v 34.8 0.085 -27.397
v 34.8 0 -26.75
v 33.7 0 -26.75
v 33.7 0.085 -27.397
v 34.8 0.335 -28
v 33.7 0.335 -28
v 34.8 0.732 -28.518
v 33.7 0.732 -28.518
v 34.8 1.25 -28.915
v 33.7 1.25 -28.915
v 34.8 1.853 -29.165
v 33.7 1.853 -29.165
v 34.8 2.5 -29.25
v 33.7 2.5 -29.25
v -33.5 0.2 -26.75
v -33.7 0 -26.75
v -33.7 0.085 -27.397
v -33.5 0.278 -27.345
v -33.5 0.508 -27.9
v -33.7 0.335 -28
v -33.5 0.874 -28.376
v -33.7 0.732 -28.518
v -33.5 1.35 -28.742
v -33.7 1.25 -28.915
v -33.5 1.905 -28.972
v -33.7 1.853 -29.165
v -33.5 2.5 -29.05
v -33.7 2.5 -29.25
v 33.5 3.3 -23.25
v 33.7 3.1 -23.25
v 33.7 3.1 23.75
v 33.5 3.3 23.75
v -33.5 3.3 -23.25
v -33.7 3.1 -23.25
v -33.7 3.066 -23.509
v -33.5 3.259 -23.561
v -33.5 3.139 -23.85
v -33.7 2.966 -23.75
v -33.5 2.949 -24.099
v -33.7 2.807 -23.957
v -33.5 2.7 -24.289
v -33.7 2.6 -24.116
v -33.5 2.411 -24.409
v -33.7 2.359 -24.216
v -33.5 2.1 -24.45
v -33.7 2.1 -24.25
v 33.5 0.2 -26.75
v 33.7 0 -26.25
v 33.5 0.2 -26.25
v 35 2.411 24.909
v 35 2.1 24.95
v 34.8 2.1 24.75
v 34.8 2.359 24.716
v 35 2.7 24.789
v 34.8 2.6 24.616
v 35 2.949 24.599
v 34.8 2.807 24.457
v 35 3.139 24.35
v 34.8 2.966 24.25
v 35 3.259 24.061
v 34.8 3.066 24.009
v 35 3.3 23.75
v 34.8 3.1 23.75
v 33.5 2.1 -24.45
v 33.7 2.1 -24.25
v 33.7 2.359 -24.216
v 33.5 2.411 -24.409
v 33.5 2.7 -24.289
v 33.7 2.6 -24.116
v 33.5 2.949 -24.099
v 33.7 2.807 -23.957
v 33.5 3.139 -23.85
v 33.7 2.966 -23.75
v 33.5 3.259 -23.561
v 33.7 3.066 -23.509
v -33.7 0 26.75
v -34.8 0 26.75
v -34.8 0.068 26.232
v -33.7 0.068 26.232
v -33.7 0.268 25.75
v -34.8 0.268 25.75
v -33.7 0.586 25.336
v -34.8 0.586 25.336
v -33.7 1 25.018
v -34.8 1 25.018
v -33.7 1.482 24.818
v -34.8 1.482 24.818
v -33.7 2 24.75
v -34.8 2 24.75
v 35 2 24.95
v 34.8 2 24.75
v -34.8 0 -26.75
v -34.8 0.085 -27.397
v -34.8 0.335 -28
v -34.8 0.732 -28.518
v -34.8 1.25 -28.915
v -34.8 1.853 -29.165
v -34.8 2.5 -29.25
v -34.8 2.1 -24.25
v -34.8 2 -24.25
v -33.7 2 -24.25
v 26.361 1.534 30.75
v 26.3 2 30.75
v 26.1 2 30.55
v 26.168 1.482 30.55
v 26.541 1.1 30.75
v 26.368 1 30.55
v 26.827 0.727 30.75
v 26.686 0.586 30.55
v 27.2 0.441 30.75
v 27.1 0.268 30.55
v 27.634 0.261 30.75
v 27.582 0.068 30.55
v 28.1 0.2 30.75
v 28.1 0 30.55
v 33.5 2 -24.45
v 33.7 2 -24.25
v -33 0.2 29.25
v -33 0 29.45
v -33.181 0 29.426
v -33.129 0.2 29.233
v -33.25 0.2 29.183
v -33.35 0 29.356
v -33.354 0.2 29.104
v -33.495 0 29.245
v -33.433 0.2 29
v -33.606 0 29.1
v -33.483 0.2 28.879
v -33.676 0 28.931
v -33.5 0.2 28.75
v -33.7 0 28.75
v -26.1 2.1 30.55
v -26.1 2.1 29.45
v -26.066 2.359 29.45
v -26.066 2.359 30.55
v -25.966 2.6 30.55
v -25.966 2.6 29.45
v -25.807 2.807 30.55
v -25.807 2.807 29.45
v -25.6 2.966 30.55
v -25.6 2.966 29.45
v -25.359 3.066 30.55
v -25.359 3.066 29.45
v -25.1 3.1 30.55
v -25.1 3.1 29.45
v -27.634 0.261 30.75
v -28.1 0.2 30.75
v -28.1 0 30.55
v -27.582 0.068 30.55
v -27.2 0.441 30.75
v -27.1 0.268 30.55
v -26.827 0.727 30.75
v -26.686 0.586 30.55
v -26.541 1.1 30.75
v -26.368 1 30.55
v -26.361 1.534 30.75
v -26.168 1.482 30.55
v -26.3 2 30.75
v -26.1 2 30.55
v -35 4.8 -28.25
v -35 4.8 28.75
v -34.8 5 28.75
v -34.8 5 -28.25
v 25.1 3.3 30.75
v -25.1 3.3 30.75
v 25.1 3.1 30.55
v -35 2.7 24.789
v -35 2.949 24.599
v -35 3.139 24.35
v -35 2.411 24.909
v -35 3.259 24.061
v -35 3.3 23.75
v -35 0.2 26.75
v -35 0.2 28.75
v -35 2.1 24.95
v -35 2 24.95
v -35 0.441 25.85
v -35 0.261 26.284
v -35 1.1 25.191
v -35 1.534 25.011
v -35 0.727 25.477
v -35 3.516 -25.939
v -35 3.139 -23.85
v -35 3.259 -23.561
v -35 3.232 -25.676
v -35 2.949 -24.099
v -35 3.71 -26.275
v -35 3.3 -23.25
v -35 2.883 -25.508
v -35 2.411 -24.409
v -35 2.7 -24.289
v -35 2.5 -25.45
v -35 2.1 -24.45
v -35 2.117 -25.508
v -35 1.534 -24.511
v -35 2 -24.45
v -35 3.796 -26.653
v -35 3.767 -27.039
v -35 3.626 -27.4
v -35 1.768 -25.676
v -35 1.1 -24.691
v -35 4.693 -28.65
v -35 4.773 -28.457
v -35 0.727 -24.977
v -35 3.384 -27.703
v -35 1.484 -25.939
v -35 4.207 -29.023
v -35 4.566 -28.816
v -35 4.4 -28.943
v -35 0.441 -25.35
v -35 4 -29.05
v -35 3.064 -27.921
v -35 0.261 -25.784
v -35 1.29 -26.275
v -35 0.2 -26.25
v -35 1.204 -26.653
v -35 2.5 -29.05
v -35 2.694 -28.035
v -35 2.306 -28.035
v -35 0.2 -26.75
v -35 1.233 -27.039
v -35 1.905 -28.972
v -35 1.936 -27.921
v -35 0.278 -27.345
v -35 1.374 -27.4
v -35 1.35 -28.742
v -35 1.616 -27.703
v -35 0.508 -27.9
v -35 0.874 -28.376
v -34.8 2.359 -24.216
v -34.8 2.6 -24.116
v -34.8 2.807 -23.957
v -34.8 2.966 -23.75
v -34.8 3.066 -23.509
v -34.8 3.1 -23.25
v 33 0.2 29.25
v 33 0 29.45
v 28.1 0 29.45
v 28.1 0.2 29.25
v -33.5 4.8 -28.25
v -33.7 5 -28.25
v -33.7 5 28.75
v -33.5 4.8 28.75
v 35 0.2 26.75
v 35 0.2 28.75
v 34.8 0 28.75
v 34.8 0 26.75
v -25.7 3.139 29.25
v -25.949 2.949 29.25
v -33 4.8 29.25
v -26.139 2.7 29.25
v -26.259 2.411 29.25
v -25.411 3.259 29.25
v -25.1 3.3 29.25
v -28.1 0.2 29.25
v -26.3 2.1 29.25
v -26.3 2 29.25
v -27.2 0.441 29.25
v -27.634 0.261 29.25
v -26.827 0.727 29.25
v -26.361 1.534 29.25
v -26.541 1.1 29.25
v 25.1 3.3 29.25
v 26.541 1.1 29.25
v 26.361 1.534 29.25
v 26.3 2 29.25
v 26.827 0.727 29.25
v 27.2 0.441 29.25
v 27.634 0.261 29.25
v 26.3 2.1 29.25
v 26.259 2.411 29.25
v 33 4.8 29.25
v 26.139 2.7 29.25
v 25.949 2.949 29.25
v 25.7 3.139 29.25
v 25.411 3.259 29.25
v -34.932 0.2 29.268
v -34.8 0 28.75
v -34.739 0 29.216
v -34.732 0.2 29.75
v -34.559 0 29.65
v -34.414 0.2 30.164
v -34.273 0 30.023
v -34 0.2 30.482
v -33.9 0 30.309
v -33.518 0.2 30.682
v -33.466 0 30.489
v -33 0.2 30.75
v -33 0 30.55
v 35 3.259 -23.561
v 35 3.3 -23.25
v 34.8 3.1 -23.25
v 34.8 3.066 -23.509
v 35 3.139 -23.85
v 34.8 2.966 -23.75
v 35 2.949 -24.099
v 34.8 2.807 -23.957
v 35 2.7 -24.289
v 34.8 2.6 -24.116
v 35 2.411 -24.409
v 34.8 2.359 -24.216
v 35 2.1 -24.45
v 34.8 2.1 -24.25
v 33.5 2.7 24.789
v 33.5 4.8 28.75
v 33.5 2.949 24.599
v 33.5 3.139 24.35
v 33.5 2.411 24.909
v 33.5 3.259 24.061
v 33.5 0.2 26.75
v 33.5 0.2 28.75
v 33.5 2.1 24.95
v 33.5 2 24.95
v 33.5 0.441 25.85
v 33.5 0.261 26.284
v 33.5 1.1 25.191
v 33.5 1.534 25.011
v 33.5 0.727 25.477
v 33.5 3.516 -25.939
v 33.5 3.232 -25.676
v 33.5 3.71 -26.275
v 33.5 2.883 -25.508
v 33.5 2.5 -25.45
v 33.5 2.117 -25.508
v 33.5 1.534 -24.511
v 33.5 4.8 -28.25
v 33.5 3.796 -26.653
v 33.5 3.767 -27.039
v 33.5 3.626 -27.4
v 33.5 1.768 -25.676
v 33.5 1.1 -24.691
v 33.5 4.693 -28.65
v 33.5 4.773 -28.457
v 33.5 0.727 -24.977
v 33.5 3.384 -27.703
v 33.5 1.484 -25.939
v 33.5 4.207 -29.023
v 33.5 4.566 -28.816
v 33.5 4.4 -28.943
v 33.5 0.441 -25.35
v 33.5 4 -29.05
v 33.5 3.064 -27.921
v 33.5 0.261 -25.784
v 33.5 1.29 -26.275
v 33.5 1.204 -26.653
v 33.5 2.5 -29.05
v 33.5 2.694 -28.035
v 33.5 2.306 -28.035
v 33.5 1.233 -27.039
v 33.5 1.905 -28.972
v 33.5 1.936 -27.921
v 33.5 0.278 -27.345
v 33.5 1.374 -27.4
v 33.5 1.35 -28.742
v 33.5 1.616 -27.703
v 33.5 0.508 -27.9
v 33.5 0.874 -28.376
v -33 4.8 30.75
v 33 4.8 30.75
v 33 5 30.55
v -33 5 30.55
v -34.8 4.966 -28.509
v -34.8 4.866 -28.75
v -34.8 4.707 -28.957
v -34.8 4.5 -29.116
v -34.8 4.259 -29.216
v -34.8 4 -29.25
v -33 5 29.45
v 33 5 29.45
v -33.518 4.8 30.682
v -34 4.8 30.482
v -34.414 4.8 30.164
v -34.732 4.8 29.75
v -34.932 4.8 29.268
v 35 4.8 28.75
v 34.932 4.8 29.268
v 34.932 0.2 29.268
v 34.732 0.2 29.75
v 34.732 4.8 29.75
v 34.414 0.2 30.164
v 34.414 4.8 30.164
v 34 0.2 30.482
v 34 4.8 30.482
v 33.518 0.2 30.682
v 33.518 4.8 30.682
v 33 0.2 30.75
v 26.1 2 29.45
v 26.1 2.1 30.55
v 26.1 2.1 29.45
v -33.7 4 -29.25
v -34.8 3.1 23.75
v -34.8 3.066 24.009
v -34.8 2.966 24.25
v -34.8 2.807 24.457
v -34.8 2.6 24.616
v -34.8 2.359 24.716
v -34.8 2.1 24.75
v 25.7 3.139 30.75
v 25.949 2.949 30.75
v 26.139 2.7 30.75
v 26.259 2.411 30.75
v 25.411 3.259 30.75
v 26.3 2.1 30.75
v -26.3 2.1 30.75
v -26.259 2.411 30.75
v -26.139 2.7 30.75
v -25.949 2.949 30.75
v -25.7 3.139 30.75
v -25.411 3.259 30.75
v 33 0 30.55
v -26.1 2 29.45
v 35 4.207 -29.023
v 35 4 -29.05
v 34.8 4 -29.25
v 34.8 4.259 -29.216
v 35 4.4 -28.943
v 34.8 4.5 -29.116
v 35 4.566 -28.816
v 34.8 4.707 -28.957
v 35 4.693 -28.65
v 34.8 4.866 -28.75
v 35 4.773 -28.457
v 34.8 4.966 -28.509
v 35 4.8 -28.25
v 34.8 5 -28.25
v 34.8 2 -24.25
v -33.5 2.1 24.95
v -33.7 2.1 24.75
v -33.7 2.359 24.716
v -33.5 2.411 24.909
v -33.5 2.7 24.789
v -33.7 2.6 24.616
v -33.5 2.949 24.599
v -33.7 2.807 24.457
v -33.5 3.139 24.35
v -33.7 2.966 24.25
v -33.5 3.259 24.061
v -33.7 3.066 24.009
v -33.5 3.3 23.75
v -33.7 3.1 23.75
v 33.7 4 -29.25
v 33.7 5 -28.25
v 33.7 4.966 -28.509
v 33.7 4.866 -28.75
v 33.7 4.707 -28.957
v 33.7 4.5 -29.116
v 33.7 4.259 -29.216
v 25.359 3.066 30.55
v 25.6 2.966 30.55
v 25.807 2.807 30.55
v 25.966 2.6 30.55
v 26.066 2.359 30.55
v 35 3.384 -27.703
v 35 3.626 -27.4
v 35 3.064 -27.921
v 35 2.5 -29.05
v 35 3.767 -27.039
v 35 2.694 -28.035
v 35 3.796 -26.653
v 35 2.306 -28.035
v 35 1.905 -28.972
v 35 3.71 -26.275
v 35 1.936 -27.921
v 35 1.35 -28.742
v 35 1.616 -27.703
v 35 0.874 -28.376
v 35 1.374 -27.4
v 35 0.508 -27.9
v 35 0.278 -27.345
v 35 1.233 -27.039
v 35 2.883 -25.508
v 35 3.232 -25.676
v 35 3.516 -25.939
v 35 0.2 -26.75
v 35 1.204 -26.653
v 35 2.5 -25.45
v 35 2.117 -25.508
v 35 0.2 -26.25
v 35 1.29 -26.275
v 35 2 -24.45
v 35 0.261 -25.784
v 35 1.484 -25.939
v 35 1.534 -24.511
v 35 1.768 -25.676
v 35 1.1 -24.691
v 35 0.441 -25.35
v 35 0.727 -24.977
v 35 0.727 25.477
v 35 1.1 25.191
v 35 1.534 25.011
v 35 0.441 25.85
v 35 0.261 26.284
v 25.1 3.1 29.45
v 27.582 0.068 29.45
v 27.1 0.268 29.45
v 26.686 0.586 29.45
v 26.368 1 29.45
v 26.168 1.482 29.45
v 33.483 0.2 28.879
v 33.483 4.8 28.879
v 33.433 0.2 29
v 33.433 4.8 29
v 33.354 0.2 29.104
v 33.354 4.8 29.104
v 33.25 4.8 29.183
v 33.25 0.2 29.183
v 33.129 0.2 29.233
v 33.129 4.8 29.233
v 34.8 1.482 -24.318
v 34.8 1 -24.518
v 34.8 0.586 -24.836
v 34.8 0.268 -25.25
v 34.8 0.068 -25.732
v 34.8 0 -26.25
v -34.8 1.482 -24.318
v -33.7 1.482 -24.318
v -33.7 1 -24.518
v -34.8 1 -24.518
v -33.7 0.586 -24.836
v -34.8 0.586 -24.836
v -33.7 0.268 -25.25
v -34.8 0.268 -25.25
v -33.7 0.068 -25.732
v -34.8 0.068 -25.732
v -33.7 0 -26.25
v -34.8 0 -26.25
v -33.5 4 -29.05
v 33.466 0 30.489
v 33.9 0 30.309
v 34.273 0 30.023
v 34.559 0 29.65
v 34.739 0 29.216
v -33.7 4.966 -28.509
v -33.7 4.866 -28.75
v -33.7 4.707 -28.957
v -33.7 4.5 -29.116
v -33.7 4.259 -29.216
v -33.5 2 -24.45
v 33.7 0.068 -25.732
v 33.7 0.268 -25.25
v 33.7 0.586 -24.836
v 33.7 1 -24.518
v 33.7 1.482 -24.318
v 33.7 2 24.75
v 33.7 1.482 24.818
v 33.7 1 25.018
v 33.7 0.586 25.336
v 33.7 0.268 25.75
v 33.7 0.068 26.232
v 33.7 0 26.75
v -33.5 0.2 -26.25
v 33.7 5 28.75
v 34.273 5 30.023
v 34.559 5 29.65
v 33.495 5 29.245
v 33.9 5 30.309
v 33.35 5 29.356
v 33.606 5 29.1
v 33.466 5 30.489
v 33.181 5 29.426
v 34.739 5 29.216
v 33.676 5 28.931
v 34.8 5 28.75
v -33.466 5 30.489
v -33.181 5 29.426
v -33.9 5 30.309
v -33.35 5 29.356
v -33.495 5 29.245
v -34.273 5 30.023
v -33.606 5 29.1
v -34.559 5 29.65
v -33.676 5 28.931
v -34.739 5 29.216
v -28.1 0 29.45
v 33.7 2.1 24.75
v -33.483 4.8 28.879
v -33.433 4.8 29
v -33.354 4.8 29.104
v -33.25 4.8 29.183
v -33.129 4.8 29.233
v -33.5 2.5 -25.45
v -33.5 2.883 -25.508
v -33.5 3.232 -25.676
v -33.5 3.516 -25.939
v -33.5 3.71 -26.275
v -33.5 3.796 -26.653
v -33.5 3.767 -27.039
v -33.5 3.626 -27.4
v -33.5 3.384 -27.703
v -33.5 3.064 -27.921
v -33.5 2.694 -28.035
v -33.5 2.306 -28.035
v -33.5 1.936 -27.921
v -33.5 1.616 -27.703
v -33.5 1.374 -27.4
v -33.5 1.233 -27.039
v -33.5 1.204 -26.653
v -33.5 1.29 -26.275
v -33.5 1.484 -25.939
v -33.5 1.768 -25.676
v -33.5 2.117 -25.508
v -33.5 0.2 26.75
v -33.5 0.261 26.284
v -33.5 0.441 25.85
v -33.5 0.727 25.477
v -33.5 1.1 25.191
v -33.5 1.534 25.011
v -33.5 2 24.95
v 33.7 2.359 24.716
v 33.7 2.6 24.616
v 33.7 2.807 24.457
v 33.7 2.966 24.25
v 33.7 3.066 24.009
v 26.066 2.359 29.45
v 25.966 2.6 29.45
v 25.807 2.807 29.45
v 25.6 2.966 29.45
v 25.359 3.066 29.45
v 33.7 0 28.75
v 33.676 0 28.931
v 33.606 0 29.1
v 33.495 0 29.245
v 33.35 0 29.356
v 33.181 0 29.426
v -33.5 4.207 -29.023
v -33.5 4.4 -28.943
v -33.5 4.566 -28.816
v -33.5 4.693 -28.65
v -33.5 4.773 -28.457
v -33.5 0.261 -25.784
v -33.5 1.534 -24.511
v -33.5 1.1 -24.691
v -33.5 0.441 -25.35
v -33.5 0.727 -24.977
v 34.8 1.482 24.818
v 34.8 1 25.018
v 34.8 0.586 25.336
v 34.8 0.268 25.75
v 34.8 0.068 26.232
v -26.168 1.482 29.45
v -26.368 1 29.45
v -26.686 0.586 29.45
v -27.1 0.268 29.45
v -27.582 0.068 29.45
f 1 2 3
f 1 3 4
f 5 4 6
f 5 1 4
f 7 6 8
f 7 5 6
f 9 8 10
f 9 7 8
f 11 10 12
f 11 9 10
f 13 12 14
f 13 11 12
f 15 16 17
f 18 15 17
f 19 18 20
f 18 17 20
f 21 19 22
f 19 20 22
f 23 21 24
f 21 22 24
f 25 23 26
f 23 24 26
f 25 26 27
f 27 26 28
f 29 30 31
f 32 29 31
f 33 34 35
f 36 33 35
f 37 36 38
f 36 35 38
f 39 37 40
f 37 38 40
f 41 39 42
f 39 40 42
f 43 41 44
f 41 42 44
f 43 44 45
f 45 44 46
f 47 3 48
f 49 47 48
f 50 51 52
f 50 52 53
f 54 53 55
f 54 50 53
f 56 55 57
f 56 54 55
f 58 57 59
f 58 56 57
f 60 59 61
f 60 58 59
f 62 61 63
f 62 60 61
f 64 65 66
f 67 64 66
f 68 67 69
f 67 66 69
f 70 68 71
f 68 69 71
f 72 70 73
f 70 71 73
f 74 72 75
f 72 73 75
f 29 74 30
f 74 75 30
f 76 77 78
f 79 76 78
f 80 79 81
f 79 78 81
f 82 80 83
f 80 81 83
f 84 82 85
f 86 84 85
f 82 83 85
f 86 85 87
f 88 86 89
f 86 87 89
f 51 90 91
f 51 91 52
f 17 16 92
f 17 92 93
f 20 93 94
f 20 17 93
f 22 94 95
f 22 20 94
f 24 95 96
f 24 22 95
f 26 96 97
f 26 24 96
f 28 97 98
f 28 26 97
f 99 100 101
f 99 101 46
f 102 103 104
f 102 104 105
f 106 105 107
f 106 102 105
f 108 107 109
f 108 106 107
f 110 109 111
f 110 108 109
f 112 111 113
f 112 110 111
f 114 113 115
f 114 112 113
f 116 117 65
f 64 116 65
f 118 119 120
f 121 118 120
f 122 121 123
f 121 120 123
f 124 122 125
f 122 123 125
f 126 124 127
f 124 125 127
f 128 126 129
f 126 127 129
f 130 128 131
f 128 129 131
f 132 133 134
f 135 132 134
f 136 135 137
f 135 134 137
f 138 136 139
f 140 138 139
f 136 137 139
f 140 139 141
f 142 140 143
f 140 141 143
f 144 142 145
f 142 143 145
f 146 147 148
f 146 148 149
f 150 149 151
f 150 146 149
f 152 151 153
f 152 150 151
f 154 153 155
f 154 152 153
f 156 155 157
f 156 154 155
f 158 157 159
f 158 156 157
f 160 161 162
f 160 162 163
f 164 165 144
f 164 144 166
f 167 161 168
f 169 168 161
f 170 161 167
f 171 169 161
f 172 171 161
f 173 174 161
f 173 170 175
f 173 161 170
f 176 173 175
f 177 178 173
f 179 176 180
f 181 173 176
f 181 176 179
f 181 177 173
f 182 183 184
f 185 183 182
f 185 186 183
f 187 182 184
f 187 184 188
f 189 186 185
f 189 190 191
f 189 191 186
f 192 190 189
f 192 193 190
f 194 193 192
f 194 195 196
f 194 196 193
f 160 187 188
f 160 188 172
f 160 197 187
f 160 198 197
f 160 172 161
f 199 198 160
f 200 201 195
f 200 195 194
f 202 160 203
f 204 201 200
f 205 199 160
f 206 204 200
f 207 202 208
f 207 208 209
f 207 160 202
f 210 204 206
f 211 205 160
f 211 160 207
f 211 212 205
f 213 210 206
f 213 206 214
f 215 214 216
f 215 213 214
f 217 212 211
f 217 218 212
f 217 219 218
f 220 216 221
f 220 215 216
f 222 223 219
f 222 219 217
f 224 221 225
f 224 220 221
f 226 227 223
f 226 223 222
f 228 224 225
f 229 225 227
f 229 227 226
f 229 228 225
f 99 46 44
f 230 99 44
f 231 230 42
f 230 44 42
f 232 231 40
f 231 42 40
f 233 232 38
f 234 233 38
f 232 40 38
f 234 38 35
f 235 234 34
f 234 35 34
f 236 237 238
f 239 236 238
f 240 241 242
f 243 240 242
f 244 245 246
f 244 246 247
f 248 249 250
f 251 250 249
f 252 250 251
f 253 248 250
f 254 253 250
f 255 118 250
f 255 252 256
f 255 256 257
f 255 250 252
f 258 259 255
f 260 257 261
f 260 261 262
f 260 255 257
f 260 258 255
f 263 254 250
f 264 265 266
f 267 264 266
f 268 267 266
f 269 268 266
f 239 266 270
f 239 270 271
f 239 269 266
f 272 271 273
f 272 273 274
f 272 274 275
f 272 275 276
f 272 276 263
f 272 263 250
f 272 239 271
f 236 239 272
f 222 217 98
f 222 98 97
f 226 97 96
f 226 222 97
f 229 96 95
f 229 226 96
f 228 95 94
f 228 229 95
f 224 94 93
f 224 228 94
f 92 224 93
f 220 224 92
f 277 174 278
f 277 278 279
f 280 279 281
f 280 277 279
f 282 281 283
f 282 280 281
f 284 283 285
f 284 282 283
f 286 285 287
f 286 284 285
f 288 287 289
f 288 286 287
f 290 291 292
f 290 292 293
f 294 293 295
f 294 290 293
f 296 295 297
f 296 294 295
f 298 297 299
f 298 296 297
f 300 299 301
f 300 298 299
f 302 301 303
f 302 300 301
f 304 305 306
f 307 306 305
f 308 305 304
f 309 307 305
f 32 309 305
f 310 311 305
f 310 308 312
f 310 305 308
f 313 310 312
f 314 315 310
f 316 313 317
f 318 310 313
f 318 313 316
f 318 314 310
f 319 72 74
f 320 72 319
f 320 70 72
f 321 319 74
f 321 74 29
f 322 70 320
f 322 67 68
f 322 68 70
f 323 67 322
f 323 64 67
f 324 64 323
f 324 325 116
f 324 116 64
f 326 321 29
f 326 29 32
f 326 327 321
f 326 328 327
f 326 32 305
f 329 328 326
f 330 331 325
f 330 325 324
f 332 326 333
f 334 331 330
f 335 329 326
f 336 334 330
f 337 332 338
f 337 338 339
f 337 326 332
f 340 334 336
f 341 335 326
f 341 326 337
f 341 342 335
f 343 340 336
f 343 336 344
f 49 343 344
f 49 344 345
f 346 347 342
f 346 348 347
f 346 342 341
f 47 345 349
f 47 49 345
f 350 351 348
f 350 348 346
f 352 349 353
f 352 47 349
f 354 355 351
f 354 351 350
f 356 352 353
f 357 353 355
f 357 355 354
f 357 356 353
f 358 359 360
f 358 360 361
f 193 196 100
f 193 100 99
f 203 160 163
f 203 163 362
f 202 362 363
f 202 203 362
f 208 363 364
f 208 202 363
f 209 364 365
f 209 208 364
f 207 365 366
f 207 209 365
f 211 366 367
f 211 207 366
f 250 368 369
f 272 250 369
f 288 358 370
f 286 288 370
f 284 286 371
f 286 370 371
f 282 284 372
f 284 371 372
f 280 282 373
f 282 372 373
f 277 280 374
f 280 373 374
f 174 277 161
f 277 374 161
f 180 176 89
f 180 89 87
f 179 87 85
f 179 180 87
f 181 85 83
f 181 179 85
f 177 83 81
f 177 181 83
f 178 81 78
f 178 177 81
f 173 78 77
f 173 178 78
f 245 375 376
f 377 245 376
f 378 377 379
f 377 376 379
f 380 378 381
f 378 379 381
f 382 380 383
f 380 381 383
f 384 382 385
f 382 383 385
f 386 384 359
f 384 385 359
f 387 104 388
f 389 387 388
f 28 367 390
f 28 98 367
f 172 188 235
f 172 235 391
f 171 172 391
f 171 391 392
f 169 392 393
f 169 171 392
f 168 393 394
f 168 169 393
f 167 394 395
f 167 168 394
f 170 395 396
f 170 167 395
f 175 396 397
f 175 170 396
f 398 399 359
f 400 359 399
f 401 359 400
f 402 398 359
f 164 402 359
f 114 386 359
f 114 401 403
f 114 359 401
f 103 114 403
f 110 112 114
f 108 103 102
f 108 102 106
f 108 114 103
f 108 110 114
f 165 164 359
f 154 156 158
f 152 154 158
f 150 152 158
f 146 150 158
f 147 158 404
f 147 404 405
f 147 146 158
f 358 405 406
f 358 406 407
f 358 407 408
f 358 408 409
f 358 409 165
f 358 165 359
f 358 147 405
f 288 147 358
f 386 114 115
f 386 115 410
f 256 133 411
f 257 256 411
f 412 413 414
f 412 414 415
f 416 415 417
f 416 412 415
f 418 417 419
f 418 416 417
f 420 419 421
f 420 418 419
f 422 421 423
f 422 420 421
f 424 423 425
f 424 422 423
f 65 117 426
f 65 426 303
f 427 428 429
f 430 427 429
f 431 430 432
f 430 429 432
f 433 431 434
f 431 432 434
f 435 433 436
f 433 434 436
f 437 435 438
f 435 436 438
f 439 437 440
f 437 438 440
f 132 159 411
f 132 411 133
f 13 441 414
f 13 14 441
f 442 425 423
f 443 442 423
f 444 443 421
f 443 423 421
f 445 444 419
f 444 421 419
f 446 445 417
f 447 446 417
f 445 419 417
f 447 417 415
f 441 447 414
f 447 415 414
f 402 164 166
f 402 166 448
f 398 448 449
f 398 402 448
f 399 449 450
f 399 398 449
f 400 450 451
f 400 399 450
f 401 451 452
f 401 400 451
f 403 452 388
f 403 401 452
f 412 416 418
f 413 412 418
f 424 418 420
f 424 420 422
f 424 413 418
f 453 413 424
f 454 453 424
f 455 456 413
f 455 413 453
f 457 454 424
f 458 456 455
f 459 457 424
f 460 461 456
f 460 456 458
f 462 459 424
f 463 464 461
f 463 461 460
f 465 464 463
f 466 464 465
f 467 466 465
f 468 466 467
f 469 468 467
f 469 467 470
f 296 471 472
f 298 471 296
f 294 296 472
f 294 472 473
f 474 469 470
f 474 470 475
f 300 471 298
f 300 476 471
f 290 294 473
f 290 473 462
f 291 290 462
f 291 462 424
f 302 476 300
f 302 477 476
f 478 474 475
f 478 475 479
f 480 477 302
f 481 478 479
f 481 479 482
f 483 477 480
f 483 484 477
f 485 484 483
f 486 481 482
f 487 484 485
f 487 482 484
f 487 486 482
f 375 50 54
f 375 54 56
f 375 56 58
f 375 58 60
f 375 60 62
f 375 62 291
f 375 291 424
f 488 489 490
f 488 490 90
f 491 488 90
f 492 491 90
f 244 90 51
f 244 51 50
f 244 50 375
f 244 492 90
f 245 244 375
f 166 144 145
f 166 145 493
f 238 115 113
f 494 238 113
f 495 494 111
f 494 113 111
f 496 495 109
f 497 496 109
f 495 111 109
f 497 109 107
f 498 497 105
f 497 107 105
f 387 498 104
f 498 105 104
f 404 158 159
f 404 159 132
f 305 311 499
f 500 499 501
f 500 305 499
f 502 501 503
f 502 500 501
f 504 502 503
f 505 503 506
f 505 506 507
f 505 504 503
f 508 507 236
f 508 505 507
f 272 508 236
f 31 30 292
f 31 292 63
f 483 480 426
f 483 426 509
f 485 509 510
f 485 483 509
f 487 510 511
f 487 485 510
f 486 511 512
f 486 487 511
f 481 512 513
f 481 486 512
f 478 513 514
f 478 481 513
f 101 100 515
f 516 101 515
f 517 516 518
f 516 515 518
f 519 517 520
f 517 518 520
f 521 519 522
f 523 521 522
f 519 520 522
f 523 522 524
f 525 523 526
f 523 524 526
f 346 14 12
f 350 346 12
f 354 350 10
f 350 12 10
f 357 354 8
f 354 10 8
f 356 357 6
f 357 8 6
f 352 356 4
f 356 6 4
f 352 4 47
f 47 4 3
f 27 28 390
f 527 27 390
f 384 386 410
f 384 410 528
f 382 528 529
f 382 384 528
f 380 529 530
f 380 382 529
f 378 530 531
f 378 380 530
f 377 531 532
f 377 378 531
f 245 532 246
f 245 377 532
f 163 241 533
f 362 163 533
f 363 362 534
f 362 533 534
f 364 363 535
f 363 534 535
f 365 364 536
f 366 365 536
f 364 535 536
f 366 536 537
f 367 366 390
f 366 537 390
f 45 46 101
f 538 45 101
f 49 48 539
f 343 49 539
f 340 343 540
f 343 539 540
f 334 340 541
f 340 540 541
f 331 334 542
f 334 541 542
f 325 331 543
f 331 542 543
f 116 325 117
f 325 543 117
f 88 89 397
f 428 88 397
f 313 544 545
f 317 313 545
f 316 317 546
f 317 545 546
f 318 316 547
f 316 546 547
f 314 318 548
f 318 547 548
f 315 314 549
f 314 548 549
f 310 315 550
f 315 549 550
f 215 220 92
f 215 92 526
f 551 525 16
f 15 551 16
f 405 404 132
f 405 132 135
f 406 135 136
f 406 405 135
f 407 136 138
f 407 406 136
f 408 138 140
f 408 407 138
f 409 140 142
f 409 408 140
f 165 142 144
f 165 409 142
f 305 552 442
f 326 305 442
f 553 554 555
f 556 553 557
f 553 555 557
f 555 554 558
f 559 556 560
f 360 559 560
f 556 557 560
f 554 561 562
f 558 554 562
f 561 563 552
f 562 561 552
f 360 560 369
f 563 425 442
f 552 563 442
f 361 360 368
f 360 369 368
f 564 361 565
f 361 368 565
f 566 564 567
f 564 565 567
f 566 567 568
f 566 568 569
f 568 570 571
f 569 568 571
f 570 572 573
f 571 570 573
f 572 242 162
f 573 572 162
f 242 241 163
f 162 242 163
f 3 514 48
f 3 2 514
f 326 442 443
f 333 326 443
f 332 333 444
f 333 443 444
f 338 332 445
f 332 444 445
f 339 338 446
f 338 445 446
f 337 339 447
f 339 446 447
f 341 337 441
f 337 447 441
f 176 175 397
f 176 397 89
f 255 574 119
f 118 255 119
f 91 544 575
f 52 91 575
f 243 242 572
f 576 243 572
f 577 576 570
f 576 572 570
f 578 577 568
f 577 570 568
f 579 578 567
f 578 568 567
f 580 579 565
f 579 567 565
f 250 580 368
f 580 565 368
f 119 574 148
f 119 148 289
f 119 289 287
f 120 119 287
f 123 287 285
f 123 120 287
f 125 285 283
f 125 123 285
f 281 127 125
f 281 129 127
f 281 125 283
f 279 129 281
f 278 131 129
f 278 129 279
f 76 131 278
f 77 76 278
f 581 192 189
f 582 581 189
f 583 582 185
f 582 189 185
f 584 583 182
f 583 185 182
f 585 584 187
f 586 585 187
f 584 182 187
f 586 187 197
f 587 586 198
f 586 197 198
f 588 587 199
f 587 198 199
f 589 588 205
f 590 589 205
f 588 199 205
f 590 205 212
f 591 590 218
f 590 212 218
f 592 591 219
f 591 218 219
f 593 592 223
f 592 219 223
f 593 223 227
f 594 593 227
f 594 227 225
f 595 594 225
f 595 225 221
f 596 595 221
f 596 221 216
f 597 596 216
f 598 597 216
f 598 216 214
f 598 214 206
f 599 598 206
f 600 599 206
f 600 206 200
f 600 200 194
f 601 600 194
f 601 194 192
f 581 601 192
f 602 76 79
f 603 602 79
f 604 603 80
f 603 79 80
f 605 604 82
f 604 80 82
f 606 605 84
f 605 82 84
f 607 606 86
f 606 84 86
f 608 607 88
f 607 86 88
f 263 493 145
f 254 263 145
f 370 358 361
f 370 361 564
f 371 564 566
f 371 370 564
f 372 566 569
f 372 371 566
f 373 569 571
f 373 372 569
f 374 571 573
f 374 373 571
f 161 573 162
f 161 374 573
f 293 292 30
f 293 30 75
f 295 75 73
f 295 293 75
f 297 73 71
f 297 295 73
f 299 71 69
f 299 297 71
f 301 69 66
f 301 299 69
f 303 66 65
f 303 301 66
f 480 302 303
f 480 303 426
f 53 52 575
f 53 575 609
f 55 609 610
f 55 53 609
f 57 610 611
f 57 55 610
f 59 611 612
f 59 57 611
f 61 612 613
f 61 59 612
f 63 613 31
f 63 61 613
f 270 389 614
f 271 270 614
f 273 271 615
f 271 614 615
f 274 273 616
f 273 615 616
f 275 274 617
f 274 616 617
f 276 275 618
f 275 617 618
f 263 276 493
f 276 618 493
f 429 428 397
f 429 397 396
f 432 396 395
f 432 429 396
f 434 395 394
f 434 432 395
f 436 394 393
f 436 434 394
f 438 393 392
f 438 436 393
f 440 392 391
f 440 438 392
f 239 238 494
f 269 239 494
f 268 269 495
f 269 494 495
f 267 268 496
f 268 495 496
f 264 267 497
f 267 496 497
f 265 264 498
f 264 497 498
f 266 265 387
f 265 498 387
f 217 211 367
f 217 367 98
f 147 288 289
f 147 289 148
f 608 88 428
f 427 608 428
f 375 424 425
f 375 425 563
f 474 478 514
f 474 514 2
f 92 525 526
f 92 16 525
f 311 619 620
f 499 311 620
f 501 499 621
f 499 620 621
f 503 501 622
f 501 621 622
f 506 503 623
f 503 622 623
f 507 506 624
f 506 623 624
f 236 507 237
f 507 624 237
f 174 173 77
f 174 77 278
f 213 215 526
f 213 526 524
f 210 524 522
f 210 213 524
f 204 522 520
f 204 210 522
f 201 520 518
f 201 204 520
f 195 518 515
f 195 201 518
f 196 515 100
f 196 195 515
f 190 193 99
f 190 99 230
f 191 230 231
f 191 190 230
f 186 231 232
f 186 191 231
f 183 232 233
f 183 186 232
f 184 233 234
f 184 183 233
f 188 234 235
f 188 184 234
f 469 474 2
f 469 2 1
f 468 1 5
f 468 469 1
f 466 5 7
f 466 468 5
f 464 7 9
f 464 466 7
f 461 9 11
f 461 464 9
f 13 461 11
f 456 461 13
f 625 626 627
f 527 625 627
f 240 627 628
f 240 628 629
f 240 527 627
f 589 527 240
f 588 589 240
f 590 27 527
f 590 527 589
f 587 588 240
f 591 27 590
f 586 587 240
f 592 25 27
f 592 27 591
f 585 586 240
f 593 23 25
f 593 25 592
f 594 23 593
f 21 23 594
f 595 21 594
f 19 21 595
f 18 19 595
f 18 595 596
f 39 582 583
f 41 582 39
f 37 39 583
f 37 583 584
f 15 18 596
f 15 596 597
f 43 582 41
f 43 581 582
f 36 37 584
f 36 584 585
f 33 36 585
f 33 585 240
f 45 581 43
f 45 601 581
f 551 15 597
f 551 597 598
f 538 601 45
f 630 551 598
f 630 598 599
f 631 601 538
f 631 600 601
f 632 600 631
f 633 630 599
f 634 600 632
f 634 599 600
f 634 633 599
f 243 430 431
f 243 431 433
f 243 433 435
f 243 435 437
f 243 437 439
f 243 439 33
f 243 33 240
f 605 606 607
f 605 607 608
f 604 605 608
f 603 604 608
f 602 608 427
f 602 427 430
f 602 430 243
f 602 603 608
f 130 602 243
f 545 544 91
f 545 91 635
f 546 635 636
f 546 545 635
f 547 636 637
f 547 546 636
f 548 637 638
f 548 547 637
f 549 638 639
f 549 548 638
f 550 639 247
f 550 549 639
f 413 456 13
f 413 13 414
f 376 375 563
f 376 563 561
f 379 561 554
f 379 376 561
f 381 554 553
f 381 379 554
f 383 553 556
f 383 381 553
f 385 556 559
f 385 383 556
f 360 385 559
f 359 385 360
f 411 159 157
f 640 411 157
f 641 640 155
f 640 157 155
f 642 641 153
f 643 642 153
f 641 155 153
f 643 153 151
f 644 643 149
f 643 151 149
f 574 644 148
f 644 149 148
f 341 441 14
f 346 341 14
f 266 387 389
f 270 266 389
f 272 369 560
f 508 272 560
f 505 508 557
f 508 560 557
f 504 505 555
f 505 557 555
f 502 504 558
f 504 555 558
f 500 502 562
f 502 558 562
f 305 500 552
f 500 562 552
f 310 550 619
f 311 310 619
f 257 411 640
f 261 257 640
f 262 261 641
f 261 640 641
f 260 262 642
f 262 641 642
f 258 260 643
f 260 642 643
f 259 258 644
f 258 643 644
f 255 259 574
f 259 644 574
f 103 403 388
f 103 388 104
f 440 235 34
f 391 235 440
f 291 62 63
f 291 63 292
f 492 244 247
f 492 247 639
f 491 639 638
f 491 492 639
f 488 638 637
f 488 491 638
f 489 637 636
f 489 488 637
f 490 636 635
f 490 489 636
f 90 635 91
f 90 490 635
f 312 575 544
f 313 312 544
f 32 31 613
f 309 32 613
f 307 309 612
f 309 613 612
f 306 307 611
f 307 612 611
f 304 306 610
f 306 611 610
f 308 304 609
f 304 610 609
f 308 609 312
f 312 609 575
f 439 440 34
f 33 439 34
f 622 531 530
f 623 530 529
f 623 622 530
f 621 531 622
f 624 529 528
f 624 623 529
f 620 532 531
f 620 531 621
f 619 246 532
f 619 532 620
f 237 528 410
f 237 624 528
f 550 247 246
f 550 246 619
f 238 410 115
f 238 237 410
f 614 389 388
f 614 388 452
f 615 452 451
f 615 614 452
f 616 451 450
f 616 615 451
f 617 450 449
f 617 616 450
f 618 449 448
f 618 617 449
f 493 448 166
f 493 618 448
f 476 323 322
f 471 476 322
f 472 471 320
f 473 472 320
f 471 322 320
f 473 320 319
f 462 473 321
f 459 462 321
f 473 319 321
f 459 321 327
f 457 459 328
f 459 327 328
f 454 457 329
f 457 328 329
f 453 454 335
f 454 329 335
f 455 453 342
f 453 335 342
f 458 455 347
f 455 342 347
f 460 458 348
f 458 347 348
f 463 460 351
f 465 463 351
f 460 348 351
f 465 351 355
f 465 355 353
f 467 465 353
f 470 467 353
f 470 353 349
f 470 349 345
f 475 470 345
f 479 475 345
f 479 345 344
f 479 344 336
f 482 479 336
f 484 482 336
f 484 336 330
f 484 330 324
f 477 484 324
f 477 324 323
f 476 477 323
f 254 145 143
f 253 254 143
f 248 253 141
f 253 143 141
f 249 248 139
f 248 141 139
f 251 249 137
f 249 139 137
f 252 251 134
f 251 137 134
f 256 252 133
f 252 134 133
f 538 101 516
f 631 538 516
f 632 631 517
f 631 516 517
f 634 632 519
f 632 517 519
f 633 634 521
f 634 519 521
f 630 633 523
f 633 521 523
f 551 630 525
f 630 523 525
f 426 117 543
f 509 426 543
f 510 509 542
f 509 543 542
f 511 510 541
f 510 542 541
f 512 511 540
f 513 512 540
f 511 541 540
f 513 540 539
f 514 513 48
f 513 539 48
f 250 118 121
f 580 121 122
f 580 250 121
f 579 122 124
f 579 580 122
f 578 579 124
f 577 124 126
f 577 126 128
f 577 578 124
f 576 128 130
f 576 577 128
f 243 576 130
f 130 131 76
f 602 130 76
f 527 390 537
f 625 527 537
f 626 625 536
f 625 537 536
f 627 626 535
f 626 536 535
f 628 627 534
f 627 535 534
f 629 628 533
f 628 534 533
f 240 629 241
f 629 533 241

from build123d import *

# Parameters (mm, degrees)
EXTRUDE_1_DEPTH     = 5
FILLET_1_R          = 2
FILLET_2_R          = 0.5
FILLET_3_R          = 2.5
SKETCH_2_R          = 1.3
CUT_EXTRUDE_1_DEPTH = 100
SKETCH_3_W          = 52.2
SKETCH_3_H          = 6.2
CUT_EXTRUDE_2_DEPTH = 5
FILLET_5_R          = 1
SKETCH_4_W          = 49
SKETCH_4_H          = 8.82072143
CUT_EXTRUDE_3_DEPTH = 100
FILLET_6_R          = 1
FILLET_7_R          = 2
CHAMFER_1_SIZE      = 0.2


with BuildPart() as part:
    # 草图1 → 凸台-拉伸1 (new body)
    with BuildSketch(Plane(origin=(0, 0, 0), x_dir=(1, 0, 0), z_dir=(0, 1, 0))):
        Polygon((33.5, 29.25), (35, 29.25), (35, -30.75), (-35, -30.75), (-35, 29.25), (-33.5, 29.25), (-33.5, -29.25), (33.5, -29.25), align=None)
    extrude(amount=EXTRUDE_1_DEPTH)

    # 圆角1
    fillet_1_edges = [part.edges().sort_by_distance(p)[0] for p in [
        (35, 2.5, 30.75),
        (-35, 2.5, 30.75),
    ]]
    fillet(fillet_1_edges, radius=FILLET_1_R)

    # 圆角2
    fillet_2_edges = [part.edges().sort_by_distance(p)[0] for p in [
        (-33.5, 2.5, 29.25),
        (33.5, 2.5, 29.25),
    ]]
    fillet(fillet_2_edges, radius=FILLET_2_R)

    # 圆角3
    fillet_3_edges = [part.edges().sort_by_distance(p)[0] for p in [
        (-34.25, 0, -29.25),
        (34.25, 0, -29.25),
    ]]
    fillet(fillet_3_edges, radius=FILLET_3_R)

    # 草图2 → 切除-拉伸1 (cut)
    with BuildSketch(Plane.ZY.offset(35)):
        with Locations((-26.75, 2.5)):
            Circle(SKETCH_2_R)
    extrude(amount=-CUT_EXTRUDE_1_DEPTH, mode=Mode.SUBTRACT)

    # 草图3 → 切除-拉伸2 (cut)
    with BuildSketch(Plane.XY.offset(30.75)):
        Rectangle(SKETCH_3_W, SKETCH_3_H)
    extrude(amount=-CUT_EXTRUDE_2_DEPTH, mode=Mode.SUBTRACT)

    # 圆角5
    fillet_5_edges = [part.edges().sort_by_distance(p)[0] for p in [
        (-26.1, 3.1, 30),
        (26.1, 3.1, 30),
    ]]
    fillet(fillet_5_edges, radius=FILLET_5_R)

    # 草图4 → 切除-拉伸3 (cut)
    with BuildSketch(Plane.ZY.offset(35)):
        with Locations((0.25, -1.310360715)):
            Rectangle(SKETCH_4_W, SKETCH_4_H)
    extrude(amount=-CUT_EXTRUDE_3_DEPTH, mode=Mode.SUBTRACT)

    # 圆角6
    fillet_6_edges = [part.edges().sort_by_distance(p)[0] for p in [
        (34.25, 3.1, -24.25),
        (-34.25, 3.1, -24.25),
        (34.25, 3.1, 24.75),
        (-34.25, 3.1, 24.75),
        (-34.25, 5, -29.25),
        (34.25, 5, -29.25),
    ]]
    fillet(fillet_6_edges, radius=FILLET_6_R)

    # 圆角7
    fillet_7_edges = [part.edges().sort_by_distance(p)[0] for p in [
        (-34.25, 0, 24.75),
        (-34.25, 0, -24.25),
        (34.25, 0, -24.25),
        (34.25, 0, 24.75),
        (-26.1, 0, 30),
        (26.1, 0, 30),
    ]]
    fillet(fillet_7_edges, radius=FILLET_7_R)

    # 倒角1
    chamfer_1_edges = [part.edges().sort_by_distance(p)[0] for p in [
        (33.5, 5, 0.25),
        (-35, 5, 0.25),
        (-35, 2.05, -24.25),
        (-35, 3.1, 0.25),
        (-35, 3.25, -29.25),
        (-35, 4.707106781, -28.957106781),
        (-33.5, 3.25, -29.25),
        (-33.5, 3.1, 0.25),
        (-33.5, 2.05, -24.25),
        (-33.5, 4.707106781, -28.957106781),
        (33.5, 3.1, 0.25),
        (33.5, 2.05, 24.75),
        (33.5, 3.25, -29.25),
        (33.5, 4.707106781, -28.957106781),
        (35, 3.25, -29.25),
        (35, 3.1, 0.25),
        (35, 2.05, -24.25),
        (35, 4.707106781, -28.957106781),
        (33.5, 2.807106781, -23.957106781),
        (35, 2.807106781, -23.957106781),
        (33.5, 2.807106781, 24.457106781),
        (35, 2.807106781, 24.457106781),
        (-35, 2.807106781, 24.457106781),
        (-33.5, 2.807106781, 24.457106781),
        (-35, 2.807106781, -23.957106781),
        (-33.5, 2.807106781, -23.957106781),
        (35, 0, -26.5),
        (33.5, 2.05, -24.25),
        (33.5, 0, 27.75),
        (33.5, 0.585786438, 25.335786438),
        (33.5, 0.585786438, -24.835786438),
        (35, 2.05, 24.75),
        (35, 0.585786438, 25.335786438),
        (35, 0.585786438, -24.835786438),
        (-33.5, 0, -26.5),
        (-35, 2.05, 24.75),
        (-35, 0, 27.75),
        (-35, 0.585786438, 25.335786438),
        (-35, 0.585786438, -24.835786438),
        (-33.5, 2.05, 24.75),
        (-33.5, 0.585786438, 25.335786438),
        (-33.5, 0.585786438, -24.835786438),
        (-30.55, 0, 29.25),
        (26.1, 2.05, 30.75),
        (30.55, 0, 30.75),
        (26.685786438, 0.585786438, 30.75),
        (-26.685786438, 0.585786438, 30.75),
        (26.1, 2.05, 29.25),
        (26.685786438, 0.585786438, 29.25),
        (-26.685786438, 0.585786438, 29.25),
        (35, 0, 27.75),
        (35, 5, 0.25),
        (-30.55, 0, 30.75),
        (-34.414213562, 0, 30.164213562),
        (34.414213562, 0, 30.164213562),
        (0, 5, 30.75),
        (-34.414213562, 5, 30.164213562),
        (34.414213562, 5, 30.164213562),
        (30.55, 0, 29.25),
        (0, 5, 29.25),
        (-33.5, 0, 27.75),
        (-33.5, 5, 0.25),
        (33.353553391, 0, 29.103553391),
        (33.353553391, 5, 29.103553391),
        (-33.353553391, 0, 29.103553391),
        (-33.353553391, 5, 29.103553391),
        (33.5, 0, -26.5),
        (33.5, 0.732233047, -28.517766953),
        (-35, 0, -26.5),
        (35, 0.732233047, -28.517766953),
        (-35, 0.732233047, -28.517766953),
        (-33.5, 0.732233047, -28.517766953),
        (0, 3.1, 30.75),
        (0, 3.1, 29.25),
        (-26.1, 2.05, 30.75),
        (-26.1, 2.05, 29.25),
        (25.807106781, 2.807106781, 30.75),
        (25.807106781, 2.807106781, 29.25),
        (-25.807106781, 2.807106781, 30.75),
        (-25.807106781, 2.807106781, 29.25),
    ]]
    chamfer(chamfer_1_edges, length=CHAMFER_1_SIZE)


solid = part.part
